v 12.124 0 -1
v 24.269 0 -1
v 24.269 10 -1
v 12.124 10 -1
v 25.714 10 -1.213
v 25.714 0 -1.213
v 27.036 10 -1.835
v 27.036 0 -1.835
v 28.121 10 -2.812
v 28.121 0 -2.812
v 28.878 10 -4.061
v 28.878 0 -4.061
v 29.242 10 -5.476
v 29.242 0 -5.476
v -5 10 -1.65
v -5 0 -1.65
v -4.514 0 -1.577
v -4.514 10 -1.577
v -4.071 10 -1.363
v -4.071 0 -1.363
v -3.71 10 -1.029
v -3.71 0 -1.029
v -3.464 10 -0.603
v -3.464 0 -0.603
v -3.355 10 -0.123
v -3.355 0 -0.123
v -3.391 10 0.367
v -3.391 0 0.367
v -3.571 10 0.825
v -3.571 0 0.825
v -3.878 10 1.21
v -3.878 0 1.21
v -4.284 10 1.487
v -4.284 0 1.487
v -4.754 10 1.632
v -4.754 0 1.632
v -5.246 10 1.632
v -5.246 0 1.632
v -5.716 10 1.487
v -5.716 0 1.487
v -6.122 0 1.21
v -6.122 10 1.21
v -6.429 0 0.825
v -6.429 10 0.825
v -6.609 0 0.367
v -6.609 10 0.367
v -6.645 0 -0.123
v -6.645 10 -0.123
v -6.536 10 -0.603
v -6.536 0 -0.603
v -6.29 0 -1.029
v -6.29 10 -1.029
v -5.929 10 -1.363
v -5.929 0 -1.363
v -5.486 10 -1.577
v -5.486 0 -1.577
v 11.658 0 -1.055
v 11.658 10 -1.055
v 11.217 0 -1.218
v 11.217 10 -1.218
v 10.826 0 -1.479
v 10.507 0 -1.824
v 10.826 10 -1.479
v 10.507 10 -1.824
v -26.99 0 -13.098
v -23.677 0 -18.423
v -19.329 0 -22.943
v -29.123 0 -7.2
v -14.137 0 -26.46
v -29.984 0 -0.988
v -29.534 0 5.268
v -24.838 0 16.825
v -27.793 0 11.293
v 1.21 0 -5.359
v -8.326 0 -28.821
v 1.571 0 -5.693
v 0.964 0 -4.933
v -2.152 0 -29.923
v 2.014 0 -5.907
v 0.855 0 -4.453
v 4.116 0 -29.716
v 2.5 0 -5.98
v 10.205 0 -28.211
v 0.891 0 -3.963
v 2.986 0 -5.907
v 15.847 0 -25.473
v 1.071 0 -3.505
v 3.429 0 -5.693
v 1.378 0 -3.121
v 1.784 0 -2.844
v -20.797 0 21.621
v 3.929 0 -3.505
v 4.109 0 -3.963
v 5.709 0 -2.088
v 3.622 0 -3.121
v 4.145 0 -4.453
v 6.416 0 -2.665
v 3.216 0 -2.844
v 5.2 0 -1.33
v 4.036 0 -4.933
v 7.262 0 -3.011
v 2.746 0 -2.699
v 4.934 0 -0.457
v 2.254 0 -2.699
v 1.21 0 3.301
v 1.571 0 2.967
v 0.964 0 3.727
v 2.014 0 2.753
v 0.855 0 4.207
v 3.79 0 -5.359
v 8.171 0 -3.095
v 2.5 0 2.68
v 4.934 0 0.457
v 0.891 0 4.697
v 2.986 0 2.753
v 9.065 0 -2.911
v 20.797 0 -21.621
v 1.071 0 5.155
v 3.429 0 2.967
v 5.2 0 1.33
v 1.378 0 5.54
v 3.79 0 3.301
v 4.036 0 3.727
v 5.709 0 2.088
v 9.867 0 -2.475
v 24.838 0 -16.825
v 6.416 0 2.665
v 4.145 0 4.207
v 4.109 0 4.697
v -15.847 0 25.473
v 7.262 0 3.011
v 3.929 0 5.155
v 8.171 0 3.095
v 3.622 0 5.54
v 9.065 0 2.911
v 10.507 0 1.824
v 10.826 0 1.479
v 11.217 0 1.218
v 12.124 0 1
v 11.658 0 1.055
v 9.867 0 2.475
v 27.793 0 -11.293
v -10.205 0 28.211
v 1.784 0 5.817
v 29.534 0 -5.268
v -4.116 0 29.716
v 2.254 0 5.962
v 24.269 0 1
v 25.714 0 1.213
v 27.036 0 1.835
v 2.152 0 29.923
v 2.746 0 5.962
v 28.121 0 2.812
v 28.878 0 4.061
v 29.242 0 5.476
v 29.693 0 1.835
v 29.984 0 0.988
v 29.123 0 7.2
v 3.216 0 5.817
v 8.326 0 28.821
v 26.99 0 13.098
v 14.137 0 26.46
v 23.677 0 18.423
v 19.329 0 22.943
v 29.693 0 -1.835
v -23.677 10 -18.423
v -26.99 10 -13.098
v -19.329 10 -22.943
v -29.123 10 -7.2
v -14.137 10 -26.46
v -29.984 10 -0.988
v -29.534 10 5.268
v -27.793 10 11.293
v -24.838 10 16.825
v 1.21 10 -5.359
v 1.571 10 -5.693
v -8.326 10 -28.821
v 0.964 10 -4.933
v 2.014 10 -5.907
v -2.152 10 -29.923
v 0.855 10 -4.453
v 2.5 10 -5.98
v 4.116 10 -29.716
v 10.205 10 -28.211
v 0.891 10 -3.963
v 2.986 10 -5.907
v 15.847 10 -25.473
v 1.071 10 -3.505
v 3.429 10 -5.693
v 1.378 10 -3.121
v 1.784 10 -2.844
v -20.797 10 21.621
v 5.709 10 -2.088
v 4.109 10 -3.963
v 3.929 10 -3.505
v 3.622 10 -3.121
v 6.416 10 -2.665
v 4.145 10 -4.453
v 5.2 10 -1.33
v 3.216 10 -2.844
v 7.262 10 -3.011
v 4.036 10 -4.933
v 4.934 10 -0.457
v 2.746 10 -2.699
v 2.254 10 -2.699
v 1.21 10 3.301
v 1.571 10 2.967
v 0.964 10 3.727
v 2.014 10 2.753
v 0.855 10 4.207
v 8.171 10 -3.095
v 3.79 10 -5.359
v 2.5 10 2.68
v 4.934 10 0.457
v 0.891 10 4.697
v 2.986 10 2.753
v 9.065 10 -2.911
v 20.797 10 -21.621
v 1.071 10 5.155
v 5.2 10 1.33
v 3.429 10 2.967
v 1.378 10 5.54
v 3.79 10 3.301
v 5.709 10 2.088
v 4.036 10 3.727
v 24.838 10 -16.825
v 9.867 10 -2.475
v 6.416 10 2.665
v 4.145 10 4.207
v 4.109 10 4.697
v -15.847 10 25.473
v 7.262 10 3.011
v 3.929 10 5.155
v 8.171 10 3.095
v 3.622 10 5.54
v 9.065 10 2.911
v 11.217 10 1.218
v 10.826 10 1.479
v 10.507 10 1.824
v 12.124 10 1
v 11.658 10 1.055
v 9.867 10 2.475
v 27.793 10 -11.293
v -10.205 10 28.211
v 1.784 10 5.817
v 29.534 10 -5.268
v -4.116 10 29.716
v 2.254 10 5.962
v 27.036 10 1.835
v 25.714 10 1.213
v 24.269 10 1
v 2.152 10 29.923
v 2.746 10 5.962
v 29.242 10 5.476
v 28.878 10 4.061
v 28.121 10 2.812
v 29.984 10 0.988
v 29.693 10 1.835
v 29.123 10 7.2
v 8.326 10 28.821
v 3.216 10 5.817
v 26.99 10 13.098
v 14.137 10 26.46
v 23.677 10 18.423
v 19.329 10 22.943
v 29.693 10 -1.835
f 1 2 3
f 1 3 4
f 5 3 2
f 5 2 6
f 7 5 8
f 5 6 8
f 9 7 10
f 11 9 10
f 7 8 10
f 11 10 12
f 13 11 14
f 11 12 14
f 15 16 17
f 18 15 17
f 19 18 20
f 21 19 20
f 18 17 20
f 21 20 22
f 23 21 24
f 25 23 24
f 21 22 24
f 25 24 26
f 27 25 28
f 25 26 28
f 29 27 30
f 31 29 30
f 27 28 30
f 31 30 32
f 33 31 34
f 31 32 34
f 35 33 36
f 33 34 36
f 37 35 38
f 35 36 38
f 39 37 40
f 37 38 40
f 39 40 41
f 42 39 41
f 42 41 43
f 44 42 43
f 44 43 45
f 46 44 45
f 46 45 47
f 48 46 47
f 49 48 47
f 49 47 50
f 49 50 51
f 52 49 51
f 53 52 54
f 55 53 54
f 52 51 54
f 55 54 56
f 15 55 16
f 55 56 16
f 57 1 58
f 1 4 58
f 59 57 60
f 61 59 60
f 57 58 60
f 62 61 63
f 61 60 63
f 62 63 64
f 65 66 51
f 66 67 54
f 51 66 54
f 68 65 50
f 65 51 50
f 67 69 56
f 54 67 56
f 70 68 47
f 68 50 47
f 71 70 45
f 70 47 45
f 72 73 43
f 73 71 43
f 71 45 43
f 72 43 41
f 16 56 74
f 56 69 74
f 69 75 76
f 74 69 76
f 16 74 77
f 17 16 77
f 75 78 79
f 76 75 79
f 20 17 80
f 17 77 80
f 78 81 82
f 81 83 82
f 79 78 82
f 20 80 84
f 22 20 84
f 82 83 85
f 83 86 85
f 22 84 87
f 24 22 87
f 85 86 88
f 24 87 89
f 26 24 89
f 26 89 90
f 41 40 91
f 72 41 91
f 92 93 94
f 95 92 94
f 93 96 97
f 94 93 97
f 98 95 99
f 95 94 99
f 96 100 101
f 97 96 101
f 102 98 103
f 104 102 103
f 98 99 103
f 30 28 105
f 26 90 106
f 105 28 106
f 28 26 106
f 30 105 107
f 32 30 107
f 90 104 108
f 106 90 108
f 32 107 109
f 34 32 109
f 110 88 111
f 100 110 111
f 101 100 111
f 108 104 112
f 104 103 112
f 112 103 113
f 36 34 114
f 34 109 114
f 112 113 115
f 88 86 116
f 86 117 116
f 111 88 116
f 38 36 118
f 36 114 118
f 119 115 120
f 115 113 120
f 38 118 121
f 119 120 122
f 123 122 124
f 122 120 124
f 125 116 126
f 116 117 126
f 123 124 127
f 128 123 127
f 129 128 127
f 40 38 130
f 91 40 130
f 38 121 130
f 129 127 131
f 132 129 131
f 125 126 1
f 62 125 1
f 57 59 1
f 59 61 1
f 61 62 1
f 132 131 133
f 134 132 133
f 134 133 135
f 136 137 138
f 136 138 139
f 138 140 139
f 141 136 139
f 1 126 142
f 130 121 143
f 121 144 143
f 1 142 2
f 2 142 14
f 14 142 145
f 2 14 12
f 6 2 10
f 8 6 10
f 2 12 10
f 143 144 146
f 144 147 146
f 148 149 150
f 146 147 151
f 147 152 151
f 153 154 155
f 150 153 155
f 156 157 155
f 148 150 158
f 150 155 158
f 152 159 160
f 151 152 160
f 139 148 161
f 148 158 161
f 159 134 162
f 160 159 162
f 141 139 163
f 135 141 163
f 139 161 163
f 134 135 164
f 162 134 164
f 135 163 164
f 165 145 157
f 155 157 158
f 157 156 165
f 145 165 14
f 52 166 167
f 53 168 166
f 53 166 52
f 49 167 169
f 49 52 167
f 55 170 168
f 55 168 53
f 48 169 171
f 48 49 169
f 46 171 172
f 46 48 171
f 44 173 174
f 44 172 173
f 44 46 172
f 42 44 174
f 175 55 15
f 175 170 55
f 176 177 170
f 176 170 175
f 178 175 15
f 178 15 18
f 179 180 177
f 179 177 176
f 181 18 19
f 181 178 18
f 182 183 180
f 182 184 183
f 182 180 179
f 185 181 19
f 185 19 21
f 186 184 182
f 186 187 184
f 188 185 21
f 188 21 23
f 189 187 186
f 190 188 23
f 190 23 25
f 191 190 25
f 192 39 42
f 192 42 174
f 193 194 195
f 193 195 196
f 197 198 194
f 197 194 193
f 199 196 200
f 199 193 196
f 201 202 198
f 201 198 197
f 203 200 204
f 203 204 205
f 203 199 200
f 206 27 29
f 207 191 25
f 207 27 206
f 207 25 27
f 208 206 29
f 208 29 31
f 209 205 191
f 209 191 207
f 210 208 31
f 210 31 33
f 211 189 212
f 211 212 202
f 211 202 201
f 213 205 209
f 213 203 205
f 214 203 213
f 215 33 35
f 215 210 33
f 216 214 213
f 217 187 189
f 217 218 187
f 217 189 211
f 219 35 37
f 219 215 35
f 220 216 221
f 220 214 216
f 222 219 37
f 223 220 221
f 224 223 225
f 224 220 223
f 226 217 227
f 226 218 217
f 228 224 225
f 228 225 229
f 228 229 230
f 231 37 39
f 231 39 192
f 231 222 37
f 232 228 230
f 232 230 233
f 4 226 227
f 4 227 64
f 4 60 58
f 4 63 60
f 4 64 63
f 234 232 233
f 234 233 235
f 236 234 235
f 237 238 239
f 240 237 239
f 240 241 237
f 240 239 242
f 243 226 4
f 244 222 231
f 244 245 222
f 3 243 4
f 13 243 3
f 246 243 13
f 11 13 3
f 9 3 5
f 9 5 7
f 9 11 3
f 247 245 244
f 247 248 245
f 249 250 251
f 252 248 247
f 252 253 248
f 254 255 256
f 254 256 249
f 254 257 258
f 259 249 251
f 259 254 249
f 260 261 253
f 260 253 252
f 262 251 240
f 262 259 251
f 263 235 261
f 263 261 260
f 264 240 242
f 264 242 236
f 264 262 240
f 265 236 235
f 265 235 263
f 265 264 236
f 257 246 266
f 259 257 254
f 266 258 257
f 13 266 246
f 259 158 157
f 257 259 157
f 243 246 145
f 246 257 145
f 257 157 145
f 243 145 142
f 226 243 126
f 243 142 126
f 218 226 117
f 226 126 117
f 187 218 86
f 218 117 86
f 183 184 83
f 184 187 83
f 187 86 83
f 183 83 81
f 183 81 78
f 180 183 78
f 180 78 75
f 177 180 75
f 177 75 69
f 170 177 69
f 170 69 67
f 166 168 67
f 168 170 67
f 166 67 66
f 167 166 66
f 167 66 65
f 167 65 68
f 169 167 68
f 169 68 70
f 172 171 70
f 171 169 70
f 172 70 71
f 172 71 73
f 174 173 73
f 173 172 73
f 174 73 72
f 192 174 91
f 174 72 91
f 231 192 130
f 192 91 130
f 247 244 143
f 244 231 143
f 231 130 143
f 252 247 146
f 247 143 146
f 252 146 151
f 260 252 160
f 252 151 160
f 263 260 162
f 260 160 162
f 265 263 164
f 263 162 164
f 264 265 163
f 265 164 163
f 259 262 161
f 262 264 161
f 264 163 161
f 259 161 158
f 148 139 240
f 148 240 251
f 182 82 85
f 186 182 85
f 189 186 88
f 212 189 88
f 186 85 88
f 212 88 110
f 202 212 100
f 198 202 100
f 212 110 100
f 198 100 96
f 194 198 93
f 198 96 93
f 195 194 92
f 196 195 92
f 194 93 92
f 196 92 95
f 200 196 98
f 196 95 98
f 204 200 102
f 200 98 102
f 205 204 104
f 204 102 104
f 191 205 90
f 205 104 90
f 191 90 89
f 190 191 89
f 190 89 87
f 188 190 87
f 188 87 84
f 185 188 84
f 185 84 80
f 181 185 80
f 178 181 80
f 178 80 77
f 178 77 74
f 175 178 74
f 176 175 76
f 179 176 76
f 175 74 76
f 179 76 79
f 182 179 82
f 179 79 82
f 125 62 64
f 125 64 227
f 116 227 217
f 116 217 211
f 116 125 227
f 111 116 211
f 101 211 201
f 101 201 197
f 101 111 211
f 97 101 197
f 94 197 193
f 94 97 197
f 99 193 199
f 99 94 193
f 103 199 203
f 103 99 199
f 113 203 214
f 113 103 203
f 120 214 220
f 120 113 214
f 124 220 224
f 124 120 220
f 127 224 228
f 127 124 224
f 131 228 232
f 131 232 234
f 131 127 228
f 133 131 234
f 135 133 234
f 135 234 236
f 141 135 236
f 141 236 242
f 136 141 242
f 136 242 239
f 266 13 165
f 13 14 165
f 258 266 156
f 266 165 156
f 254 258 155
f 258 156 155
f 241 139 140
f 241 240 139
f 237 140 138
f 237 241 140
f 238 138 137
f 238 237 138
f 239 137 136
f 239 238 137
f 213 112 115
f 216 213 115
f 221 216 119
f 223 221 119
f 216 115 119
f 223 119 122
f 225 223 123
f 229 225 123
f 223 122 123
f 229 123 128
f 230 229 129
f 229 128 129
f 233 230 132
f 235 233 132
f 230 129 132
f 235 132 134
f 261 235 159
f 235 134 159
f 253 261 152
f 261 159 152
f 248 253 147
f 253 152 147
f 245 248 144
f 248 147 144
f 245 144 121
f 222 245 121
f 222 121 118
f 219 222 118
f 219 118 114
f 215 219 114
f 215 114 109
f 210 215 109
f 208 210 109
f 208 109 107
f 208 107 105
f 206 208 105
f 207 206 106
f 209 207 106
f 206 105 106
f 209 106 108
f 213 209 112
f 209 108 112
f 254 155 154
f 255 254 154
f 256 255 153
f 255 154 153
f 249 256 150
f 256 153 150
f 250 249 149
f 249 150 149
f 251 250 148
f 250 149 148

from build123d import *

# Parameters (mm, degrees)
SKETCH_1_R          = 30
EXTRUDE_1_DEPTH     = 10
CUT_EXTRUDE_1_DEPTH = 10
FILLET_1_R          = 2
FILLET_2_R          = 5
SKETCH_3_R          = 1.65
CUT_EXTRUDE_2_DEPTH = 10
SKETCH_4_R          = 30
SKETCH_4_R_2        = 29.75
EXTRUDE_2_DEPTH     = 10


with BuildPart() as part:
    # 草图1 → 凸台-拉伸1 (new body)
    with BuildSketch(Plane(origin=(0, 0, 0), x_dir=(1, 0, 0), z_dir=(0, 1, 0))):
        with Locations(Location((0, 0, 0), (0, 0, 270))):
            Circle(SKETCH_1_R)
    extrude(amount=EXTRUDE_1_DEPTH)

    # 草图2 → 切除-拉伸1 (cut)
    with BuildSketch(Plane.XZ):
        with BuildLine():
            Line((10.93428015, 1), (30.93428015, 1))
            Line((30.93428015, 1), (30.93428015, -1))
            Line((30.93428015, -1), (10.93428015, -1))
            ThreePointArc((10.93428015, -1), (4.9, 0), (10.93428015, 1))
        make_face()
    extrude(amount=-CUT_EXTRUDE_1_DEPTH, mode=Mode.SUBTRACT)

    # 圆角1
    fillet_1_edges = [part.edges().sort_by_distance(p)[0] for p in [
        (10.93428015, 5, 1),
        (10.93428015, 5, -1),
    ]]
    fillet(fillet_1_edges, radius=FILLET_1_R)

    # 圆角2
    fillet_2_edges = [part.edges().sort_by_distance(p)[0] for p in [
        (29.983328701, 5, 1),
        (29.983328701, 5, -1),
    ]]
    fillet(fillet_2_edges, radius=FILLET_2_R)

    # 草图3 → 切除-拉伸2 (cut)
    with BuildSketch(Plane.XZ):
        with Locations(Location((-5, 0, 0), (0, 0, 270))):
            Circle(SKETCH_3_R)
        with Locations(Location((2.5, 4.330127019, 0), (0, 0, 270))):
            Circle(SKETCH_3_R)
        with Locations(Location((2.5, -4.330127019, 0), (0, 0, 270))):
            Circle(SKETCH_3_R)
    extrude(amount=-CUT_EXTRUDE_2_DEPTH, mode=Mode.SUBTRACT)

    # 草图4 → 凸台-拉伸2 (add)
    with BuildSketch(Plane.XZ):
        with Locations(Location((0, 0, 0), (0, 0, 90))):
            Circle(SKETCH_4_R)
        Circle(SKETCH_4_R_2, mode=Mode.SUBTRACT)
    extrude(amount=-EXTRUDE_2_DEPTH)


solid = part.part
